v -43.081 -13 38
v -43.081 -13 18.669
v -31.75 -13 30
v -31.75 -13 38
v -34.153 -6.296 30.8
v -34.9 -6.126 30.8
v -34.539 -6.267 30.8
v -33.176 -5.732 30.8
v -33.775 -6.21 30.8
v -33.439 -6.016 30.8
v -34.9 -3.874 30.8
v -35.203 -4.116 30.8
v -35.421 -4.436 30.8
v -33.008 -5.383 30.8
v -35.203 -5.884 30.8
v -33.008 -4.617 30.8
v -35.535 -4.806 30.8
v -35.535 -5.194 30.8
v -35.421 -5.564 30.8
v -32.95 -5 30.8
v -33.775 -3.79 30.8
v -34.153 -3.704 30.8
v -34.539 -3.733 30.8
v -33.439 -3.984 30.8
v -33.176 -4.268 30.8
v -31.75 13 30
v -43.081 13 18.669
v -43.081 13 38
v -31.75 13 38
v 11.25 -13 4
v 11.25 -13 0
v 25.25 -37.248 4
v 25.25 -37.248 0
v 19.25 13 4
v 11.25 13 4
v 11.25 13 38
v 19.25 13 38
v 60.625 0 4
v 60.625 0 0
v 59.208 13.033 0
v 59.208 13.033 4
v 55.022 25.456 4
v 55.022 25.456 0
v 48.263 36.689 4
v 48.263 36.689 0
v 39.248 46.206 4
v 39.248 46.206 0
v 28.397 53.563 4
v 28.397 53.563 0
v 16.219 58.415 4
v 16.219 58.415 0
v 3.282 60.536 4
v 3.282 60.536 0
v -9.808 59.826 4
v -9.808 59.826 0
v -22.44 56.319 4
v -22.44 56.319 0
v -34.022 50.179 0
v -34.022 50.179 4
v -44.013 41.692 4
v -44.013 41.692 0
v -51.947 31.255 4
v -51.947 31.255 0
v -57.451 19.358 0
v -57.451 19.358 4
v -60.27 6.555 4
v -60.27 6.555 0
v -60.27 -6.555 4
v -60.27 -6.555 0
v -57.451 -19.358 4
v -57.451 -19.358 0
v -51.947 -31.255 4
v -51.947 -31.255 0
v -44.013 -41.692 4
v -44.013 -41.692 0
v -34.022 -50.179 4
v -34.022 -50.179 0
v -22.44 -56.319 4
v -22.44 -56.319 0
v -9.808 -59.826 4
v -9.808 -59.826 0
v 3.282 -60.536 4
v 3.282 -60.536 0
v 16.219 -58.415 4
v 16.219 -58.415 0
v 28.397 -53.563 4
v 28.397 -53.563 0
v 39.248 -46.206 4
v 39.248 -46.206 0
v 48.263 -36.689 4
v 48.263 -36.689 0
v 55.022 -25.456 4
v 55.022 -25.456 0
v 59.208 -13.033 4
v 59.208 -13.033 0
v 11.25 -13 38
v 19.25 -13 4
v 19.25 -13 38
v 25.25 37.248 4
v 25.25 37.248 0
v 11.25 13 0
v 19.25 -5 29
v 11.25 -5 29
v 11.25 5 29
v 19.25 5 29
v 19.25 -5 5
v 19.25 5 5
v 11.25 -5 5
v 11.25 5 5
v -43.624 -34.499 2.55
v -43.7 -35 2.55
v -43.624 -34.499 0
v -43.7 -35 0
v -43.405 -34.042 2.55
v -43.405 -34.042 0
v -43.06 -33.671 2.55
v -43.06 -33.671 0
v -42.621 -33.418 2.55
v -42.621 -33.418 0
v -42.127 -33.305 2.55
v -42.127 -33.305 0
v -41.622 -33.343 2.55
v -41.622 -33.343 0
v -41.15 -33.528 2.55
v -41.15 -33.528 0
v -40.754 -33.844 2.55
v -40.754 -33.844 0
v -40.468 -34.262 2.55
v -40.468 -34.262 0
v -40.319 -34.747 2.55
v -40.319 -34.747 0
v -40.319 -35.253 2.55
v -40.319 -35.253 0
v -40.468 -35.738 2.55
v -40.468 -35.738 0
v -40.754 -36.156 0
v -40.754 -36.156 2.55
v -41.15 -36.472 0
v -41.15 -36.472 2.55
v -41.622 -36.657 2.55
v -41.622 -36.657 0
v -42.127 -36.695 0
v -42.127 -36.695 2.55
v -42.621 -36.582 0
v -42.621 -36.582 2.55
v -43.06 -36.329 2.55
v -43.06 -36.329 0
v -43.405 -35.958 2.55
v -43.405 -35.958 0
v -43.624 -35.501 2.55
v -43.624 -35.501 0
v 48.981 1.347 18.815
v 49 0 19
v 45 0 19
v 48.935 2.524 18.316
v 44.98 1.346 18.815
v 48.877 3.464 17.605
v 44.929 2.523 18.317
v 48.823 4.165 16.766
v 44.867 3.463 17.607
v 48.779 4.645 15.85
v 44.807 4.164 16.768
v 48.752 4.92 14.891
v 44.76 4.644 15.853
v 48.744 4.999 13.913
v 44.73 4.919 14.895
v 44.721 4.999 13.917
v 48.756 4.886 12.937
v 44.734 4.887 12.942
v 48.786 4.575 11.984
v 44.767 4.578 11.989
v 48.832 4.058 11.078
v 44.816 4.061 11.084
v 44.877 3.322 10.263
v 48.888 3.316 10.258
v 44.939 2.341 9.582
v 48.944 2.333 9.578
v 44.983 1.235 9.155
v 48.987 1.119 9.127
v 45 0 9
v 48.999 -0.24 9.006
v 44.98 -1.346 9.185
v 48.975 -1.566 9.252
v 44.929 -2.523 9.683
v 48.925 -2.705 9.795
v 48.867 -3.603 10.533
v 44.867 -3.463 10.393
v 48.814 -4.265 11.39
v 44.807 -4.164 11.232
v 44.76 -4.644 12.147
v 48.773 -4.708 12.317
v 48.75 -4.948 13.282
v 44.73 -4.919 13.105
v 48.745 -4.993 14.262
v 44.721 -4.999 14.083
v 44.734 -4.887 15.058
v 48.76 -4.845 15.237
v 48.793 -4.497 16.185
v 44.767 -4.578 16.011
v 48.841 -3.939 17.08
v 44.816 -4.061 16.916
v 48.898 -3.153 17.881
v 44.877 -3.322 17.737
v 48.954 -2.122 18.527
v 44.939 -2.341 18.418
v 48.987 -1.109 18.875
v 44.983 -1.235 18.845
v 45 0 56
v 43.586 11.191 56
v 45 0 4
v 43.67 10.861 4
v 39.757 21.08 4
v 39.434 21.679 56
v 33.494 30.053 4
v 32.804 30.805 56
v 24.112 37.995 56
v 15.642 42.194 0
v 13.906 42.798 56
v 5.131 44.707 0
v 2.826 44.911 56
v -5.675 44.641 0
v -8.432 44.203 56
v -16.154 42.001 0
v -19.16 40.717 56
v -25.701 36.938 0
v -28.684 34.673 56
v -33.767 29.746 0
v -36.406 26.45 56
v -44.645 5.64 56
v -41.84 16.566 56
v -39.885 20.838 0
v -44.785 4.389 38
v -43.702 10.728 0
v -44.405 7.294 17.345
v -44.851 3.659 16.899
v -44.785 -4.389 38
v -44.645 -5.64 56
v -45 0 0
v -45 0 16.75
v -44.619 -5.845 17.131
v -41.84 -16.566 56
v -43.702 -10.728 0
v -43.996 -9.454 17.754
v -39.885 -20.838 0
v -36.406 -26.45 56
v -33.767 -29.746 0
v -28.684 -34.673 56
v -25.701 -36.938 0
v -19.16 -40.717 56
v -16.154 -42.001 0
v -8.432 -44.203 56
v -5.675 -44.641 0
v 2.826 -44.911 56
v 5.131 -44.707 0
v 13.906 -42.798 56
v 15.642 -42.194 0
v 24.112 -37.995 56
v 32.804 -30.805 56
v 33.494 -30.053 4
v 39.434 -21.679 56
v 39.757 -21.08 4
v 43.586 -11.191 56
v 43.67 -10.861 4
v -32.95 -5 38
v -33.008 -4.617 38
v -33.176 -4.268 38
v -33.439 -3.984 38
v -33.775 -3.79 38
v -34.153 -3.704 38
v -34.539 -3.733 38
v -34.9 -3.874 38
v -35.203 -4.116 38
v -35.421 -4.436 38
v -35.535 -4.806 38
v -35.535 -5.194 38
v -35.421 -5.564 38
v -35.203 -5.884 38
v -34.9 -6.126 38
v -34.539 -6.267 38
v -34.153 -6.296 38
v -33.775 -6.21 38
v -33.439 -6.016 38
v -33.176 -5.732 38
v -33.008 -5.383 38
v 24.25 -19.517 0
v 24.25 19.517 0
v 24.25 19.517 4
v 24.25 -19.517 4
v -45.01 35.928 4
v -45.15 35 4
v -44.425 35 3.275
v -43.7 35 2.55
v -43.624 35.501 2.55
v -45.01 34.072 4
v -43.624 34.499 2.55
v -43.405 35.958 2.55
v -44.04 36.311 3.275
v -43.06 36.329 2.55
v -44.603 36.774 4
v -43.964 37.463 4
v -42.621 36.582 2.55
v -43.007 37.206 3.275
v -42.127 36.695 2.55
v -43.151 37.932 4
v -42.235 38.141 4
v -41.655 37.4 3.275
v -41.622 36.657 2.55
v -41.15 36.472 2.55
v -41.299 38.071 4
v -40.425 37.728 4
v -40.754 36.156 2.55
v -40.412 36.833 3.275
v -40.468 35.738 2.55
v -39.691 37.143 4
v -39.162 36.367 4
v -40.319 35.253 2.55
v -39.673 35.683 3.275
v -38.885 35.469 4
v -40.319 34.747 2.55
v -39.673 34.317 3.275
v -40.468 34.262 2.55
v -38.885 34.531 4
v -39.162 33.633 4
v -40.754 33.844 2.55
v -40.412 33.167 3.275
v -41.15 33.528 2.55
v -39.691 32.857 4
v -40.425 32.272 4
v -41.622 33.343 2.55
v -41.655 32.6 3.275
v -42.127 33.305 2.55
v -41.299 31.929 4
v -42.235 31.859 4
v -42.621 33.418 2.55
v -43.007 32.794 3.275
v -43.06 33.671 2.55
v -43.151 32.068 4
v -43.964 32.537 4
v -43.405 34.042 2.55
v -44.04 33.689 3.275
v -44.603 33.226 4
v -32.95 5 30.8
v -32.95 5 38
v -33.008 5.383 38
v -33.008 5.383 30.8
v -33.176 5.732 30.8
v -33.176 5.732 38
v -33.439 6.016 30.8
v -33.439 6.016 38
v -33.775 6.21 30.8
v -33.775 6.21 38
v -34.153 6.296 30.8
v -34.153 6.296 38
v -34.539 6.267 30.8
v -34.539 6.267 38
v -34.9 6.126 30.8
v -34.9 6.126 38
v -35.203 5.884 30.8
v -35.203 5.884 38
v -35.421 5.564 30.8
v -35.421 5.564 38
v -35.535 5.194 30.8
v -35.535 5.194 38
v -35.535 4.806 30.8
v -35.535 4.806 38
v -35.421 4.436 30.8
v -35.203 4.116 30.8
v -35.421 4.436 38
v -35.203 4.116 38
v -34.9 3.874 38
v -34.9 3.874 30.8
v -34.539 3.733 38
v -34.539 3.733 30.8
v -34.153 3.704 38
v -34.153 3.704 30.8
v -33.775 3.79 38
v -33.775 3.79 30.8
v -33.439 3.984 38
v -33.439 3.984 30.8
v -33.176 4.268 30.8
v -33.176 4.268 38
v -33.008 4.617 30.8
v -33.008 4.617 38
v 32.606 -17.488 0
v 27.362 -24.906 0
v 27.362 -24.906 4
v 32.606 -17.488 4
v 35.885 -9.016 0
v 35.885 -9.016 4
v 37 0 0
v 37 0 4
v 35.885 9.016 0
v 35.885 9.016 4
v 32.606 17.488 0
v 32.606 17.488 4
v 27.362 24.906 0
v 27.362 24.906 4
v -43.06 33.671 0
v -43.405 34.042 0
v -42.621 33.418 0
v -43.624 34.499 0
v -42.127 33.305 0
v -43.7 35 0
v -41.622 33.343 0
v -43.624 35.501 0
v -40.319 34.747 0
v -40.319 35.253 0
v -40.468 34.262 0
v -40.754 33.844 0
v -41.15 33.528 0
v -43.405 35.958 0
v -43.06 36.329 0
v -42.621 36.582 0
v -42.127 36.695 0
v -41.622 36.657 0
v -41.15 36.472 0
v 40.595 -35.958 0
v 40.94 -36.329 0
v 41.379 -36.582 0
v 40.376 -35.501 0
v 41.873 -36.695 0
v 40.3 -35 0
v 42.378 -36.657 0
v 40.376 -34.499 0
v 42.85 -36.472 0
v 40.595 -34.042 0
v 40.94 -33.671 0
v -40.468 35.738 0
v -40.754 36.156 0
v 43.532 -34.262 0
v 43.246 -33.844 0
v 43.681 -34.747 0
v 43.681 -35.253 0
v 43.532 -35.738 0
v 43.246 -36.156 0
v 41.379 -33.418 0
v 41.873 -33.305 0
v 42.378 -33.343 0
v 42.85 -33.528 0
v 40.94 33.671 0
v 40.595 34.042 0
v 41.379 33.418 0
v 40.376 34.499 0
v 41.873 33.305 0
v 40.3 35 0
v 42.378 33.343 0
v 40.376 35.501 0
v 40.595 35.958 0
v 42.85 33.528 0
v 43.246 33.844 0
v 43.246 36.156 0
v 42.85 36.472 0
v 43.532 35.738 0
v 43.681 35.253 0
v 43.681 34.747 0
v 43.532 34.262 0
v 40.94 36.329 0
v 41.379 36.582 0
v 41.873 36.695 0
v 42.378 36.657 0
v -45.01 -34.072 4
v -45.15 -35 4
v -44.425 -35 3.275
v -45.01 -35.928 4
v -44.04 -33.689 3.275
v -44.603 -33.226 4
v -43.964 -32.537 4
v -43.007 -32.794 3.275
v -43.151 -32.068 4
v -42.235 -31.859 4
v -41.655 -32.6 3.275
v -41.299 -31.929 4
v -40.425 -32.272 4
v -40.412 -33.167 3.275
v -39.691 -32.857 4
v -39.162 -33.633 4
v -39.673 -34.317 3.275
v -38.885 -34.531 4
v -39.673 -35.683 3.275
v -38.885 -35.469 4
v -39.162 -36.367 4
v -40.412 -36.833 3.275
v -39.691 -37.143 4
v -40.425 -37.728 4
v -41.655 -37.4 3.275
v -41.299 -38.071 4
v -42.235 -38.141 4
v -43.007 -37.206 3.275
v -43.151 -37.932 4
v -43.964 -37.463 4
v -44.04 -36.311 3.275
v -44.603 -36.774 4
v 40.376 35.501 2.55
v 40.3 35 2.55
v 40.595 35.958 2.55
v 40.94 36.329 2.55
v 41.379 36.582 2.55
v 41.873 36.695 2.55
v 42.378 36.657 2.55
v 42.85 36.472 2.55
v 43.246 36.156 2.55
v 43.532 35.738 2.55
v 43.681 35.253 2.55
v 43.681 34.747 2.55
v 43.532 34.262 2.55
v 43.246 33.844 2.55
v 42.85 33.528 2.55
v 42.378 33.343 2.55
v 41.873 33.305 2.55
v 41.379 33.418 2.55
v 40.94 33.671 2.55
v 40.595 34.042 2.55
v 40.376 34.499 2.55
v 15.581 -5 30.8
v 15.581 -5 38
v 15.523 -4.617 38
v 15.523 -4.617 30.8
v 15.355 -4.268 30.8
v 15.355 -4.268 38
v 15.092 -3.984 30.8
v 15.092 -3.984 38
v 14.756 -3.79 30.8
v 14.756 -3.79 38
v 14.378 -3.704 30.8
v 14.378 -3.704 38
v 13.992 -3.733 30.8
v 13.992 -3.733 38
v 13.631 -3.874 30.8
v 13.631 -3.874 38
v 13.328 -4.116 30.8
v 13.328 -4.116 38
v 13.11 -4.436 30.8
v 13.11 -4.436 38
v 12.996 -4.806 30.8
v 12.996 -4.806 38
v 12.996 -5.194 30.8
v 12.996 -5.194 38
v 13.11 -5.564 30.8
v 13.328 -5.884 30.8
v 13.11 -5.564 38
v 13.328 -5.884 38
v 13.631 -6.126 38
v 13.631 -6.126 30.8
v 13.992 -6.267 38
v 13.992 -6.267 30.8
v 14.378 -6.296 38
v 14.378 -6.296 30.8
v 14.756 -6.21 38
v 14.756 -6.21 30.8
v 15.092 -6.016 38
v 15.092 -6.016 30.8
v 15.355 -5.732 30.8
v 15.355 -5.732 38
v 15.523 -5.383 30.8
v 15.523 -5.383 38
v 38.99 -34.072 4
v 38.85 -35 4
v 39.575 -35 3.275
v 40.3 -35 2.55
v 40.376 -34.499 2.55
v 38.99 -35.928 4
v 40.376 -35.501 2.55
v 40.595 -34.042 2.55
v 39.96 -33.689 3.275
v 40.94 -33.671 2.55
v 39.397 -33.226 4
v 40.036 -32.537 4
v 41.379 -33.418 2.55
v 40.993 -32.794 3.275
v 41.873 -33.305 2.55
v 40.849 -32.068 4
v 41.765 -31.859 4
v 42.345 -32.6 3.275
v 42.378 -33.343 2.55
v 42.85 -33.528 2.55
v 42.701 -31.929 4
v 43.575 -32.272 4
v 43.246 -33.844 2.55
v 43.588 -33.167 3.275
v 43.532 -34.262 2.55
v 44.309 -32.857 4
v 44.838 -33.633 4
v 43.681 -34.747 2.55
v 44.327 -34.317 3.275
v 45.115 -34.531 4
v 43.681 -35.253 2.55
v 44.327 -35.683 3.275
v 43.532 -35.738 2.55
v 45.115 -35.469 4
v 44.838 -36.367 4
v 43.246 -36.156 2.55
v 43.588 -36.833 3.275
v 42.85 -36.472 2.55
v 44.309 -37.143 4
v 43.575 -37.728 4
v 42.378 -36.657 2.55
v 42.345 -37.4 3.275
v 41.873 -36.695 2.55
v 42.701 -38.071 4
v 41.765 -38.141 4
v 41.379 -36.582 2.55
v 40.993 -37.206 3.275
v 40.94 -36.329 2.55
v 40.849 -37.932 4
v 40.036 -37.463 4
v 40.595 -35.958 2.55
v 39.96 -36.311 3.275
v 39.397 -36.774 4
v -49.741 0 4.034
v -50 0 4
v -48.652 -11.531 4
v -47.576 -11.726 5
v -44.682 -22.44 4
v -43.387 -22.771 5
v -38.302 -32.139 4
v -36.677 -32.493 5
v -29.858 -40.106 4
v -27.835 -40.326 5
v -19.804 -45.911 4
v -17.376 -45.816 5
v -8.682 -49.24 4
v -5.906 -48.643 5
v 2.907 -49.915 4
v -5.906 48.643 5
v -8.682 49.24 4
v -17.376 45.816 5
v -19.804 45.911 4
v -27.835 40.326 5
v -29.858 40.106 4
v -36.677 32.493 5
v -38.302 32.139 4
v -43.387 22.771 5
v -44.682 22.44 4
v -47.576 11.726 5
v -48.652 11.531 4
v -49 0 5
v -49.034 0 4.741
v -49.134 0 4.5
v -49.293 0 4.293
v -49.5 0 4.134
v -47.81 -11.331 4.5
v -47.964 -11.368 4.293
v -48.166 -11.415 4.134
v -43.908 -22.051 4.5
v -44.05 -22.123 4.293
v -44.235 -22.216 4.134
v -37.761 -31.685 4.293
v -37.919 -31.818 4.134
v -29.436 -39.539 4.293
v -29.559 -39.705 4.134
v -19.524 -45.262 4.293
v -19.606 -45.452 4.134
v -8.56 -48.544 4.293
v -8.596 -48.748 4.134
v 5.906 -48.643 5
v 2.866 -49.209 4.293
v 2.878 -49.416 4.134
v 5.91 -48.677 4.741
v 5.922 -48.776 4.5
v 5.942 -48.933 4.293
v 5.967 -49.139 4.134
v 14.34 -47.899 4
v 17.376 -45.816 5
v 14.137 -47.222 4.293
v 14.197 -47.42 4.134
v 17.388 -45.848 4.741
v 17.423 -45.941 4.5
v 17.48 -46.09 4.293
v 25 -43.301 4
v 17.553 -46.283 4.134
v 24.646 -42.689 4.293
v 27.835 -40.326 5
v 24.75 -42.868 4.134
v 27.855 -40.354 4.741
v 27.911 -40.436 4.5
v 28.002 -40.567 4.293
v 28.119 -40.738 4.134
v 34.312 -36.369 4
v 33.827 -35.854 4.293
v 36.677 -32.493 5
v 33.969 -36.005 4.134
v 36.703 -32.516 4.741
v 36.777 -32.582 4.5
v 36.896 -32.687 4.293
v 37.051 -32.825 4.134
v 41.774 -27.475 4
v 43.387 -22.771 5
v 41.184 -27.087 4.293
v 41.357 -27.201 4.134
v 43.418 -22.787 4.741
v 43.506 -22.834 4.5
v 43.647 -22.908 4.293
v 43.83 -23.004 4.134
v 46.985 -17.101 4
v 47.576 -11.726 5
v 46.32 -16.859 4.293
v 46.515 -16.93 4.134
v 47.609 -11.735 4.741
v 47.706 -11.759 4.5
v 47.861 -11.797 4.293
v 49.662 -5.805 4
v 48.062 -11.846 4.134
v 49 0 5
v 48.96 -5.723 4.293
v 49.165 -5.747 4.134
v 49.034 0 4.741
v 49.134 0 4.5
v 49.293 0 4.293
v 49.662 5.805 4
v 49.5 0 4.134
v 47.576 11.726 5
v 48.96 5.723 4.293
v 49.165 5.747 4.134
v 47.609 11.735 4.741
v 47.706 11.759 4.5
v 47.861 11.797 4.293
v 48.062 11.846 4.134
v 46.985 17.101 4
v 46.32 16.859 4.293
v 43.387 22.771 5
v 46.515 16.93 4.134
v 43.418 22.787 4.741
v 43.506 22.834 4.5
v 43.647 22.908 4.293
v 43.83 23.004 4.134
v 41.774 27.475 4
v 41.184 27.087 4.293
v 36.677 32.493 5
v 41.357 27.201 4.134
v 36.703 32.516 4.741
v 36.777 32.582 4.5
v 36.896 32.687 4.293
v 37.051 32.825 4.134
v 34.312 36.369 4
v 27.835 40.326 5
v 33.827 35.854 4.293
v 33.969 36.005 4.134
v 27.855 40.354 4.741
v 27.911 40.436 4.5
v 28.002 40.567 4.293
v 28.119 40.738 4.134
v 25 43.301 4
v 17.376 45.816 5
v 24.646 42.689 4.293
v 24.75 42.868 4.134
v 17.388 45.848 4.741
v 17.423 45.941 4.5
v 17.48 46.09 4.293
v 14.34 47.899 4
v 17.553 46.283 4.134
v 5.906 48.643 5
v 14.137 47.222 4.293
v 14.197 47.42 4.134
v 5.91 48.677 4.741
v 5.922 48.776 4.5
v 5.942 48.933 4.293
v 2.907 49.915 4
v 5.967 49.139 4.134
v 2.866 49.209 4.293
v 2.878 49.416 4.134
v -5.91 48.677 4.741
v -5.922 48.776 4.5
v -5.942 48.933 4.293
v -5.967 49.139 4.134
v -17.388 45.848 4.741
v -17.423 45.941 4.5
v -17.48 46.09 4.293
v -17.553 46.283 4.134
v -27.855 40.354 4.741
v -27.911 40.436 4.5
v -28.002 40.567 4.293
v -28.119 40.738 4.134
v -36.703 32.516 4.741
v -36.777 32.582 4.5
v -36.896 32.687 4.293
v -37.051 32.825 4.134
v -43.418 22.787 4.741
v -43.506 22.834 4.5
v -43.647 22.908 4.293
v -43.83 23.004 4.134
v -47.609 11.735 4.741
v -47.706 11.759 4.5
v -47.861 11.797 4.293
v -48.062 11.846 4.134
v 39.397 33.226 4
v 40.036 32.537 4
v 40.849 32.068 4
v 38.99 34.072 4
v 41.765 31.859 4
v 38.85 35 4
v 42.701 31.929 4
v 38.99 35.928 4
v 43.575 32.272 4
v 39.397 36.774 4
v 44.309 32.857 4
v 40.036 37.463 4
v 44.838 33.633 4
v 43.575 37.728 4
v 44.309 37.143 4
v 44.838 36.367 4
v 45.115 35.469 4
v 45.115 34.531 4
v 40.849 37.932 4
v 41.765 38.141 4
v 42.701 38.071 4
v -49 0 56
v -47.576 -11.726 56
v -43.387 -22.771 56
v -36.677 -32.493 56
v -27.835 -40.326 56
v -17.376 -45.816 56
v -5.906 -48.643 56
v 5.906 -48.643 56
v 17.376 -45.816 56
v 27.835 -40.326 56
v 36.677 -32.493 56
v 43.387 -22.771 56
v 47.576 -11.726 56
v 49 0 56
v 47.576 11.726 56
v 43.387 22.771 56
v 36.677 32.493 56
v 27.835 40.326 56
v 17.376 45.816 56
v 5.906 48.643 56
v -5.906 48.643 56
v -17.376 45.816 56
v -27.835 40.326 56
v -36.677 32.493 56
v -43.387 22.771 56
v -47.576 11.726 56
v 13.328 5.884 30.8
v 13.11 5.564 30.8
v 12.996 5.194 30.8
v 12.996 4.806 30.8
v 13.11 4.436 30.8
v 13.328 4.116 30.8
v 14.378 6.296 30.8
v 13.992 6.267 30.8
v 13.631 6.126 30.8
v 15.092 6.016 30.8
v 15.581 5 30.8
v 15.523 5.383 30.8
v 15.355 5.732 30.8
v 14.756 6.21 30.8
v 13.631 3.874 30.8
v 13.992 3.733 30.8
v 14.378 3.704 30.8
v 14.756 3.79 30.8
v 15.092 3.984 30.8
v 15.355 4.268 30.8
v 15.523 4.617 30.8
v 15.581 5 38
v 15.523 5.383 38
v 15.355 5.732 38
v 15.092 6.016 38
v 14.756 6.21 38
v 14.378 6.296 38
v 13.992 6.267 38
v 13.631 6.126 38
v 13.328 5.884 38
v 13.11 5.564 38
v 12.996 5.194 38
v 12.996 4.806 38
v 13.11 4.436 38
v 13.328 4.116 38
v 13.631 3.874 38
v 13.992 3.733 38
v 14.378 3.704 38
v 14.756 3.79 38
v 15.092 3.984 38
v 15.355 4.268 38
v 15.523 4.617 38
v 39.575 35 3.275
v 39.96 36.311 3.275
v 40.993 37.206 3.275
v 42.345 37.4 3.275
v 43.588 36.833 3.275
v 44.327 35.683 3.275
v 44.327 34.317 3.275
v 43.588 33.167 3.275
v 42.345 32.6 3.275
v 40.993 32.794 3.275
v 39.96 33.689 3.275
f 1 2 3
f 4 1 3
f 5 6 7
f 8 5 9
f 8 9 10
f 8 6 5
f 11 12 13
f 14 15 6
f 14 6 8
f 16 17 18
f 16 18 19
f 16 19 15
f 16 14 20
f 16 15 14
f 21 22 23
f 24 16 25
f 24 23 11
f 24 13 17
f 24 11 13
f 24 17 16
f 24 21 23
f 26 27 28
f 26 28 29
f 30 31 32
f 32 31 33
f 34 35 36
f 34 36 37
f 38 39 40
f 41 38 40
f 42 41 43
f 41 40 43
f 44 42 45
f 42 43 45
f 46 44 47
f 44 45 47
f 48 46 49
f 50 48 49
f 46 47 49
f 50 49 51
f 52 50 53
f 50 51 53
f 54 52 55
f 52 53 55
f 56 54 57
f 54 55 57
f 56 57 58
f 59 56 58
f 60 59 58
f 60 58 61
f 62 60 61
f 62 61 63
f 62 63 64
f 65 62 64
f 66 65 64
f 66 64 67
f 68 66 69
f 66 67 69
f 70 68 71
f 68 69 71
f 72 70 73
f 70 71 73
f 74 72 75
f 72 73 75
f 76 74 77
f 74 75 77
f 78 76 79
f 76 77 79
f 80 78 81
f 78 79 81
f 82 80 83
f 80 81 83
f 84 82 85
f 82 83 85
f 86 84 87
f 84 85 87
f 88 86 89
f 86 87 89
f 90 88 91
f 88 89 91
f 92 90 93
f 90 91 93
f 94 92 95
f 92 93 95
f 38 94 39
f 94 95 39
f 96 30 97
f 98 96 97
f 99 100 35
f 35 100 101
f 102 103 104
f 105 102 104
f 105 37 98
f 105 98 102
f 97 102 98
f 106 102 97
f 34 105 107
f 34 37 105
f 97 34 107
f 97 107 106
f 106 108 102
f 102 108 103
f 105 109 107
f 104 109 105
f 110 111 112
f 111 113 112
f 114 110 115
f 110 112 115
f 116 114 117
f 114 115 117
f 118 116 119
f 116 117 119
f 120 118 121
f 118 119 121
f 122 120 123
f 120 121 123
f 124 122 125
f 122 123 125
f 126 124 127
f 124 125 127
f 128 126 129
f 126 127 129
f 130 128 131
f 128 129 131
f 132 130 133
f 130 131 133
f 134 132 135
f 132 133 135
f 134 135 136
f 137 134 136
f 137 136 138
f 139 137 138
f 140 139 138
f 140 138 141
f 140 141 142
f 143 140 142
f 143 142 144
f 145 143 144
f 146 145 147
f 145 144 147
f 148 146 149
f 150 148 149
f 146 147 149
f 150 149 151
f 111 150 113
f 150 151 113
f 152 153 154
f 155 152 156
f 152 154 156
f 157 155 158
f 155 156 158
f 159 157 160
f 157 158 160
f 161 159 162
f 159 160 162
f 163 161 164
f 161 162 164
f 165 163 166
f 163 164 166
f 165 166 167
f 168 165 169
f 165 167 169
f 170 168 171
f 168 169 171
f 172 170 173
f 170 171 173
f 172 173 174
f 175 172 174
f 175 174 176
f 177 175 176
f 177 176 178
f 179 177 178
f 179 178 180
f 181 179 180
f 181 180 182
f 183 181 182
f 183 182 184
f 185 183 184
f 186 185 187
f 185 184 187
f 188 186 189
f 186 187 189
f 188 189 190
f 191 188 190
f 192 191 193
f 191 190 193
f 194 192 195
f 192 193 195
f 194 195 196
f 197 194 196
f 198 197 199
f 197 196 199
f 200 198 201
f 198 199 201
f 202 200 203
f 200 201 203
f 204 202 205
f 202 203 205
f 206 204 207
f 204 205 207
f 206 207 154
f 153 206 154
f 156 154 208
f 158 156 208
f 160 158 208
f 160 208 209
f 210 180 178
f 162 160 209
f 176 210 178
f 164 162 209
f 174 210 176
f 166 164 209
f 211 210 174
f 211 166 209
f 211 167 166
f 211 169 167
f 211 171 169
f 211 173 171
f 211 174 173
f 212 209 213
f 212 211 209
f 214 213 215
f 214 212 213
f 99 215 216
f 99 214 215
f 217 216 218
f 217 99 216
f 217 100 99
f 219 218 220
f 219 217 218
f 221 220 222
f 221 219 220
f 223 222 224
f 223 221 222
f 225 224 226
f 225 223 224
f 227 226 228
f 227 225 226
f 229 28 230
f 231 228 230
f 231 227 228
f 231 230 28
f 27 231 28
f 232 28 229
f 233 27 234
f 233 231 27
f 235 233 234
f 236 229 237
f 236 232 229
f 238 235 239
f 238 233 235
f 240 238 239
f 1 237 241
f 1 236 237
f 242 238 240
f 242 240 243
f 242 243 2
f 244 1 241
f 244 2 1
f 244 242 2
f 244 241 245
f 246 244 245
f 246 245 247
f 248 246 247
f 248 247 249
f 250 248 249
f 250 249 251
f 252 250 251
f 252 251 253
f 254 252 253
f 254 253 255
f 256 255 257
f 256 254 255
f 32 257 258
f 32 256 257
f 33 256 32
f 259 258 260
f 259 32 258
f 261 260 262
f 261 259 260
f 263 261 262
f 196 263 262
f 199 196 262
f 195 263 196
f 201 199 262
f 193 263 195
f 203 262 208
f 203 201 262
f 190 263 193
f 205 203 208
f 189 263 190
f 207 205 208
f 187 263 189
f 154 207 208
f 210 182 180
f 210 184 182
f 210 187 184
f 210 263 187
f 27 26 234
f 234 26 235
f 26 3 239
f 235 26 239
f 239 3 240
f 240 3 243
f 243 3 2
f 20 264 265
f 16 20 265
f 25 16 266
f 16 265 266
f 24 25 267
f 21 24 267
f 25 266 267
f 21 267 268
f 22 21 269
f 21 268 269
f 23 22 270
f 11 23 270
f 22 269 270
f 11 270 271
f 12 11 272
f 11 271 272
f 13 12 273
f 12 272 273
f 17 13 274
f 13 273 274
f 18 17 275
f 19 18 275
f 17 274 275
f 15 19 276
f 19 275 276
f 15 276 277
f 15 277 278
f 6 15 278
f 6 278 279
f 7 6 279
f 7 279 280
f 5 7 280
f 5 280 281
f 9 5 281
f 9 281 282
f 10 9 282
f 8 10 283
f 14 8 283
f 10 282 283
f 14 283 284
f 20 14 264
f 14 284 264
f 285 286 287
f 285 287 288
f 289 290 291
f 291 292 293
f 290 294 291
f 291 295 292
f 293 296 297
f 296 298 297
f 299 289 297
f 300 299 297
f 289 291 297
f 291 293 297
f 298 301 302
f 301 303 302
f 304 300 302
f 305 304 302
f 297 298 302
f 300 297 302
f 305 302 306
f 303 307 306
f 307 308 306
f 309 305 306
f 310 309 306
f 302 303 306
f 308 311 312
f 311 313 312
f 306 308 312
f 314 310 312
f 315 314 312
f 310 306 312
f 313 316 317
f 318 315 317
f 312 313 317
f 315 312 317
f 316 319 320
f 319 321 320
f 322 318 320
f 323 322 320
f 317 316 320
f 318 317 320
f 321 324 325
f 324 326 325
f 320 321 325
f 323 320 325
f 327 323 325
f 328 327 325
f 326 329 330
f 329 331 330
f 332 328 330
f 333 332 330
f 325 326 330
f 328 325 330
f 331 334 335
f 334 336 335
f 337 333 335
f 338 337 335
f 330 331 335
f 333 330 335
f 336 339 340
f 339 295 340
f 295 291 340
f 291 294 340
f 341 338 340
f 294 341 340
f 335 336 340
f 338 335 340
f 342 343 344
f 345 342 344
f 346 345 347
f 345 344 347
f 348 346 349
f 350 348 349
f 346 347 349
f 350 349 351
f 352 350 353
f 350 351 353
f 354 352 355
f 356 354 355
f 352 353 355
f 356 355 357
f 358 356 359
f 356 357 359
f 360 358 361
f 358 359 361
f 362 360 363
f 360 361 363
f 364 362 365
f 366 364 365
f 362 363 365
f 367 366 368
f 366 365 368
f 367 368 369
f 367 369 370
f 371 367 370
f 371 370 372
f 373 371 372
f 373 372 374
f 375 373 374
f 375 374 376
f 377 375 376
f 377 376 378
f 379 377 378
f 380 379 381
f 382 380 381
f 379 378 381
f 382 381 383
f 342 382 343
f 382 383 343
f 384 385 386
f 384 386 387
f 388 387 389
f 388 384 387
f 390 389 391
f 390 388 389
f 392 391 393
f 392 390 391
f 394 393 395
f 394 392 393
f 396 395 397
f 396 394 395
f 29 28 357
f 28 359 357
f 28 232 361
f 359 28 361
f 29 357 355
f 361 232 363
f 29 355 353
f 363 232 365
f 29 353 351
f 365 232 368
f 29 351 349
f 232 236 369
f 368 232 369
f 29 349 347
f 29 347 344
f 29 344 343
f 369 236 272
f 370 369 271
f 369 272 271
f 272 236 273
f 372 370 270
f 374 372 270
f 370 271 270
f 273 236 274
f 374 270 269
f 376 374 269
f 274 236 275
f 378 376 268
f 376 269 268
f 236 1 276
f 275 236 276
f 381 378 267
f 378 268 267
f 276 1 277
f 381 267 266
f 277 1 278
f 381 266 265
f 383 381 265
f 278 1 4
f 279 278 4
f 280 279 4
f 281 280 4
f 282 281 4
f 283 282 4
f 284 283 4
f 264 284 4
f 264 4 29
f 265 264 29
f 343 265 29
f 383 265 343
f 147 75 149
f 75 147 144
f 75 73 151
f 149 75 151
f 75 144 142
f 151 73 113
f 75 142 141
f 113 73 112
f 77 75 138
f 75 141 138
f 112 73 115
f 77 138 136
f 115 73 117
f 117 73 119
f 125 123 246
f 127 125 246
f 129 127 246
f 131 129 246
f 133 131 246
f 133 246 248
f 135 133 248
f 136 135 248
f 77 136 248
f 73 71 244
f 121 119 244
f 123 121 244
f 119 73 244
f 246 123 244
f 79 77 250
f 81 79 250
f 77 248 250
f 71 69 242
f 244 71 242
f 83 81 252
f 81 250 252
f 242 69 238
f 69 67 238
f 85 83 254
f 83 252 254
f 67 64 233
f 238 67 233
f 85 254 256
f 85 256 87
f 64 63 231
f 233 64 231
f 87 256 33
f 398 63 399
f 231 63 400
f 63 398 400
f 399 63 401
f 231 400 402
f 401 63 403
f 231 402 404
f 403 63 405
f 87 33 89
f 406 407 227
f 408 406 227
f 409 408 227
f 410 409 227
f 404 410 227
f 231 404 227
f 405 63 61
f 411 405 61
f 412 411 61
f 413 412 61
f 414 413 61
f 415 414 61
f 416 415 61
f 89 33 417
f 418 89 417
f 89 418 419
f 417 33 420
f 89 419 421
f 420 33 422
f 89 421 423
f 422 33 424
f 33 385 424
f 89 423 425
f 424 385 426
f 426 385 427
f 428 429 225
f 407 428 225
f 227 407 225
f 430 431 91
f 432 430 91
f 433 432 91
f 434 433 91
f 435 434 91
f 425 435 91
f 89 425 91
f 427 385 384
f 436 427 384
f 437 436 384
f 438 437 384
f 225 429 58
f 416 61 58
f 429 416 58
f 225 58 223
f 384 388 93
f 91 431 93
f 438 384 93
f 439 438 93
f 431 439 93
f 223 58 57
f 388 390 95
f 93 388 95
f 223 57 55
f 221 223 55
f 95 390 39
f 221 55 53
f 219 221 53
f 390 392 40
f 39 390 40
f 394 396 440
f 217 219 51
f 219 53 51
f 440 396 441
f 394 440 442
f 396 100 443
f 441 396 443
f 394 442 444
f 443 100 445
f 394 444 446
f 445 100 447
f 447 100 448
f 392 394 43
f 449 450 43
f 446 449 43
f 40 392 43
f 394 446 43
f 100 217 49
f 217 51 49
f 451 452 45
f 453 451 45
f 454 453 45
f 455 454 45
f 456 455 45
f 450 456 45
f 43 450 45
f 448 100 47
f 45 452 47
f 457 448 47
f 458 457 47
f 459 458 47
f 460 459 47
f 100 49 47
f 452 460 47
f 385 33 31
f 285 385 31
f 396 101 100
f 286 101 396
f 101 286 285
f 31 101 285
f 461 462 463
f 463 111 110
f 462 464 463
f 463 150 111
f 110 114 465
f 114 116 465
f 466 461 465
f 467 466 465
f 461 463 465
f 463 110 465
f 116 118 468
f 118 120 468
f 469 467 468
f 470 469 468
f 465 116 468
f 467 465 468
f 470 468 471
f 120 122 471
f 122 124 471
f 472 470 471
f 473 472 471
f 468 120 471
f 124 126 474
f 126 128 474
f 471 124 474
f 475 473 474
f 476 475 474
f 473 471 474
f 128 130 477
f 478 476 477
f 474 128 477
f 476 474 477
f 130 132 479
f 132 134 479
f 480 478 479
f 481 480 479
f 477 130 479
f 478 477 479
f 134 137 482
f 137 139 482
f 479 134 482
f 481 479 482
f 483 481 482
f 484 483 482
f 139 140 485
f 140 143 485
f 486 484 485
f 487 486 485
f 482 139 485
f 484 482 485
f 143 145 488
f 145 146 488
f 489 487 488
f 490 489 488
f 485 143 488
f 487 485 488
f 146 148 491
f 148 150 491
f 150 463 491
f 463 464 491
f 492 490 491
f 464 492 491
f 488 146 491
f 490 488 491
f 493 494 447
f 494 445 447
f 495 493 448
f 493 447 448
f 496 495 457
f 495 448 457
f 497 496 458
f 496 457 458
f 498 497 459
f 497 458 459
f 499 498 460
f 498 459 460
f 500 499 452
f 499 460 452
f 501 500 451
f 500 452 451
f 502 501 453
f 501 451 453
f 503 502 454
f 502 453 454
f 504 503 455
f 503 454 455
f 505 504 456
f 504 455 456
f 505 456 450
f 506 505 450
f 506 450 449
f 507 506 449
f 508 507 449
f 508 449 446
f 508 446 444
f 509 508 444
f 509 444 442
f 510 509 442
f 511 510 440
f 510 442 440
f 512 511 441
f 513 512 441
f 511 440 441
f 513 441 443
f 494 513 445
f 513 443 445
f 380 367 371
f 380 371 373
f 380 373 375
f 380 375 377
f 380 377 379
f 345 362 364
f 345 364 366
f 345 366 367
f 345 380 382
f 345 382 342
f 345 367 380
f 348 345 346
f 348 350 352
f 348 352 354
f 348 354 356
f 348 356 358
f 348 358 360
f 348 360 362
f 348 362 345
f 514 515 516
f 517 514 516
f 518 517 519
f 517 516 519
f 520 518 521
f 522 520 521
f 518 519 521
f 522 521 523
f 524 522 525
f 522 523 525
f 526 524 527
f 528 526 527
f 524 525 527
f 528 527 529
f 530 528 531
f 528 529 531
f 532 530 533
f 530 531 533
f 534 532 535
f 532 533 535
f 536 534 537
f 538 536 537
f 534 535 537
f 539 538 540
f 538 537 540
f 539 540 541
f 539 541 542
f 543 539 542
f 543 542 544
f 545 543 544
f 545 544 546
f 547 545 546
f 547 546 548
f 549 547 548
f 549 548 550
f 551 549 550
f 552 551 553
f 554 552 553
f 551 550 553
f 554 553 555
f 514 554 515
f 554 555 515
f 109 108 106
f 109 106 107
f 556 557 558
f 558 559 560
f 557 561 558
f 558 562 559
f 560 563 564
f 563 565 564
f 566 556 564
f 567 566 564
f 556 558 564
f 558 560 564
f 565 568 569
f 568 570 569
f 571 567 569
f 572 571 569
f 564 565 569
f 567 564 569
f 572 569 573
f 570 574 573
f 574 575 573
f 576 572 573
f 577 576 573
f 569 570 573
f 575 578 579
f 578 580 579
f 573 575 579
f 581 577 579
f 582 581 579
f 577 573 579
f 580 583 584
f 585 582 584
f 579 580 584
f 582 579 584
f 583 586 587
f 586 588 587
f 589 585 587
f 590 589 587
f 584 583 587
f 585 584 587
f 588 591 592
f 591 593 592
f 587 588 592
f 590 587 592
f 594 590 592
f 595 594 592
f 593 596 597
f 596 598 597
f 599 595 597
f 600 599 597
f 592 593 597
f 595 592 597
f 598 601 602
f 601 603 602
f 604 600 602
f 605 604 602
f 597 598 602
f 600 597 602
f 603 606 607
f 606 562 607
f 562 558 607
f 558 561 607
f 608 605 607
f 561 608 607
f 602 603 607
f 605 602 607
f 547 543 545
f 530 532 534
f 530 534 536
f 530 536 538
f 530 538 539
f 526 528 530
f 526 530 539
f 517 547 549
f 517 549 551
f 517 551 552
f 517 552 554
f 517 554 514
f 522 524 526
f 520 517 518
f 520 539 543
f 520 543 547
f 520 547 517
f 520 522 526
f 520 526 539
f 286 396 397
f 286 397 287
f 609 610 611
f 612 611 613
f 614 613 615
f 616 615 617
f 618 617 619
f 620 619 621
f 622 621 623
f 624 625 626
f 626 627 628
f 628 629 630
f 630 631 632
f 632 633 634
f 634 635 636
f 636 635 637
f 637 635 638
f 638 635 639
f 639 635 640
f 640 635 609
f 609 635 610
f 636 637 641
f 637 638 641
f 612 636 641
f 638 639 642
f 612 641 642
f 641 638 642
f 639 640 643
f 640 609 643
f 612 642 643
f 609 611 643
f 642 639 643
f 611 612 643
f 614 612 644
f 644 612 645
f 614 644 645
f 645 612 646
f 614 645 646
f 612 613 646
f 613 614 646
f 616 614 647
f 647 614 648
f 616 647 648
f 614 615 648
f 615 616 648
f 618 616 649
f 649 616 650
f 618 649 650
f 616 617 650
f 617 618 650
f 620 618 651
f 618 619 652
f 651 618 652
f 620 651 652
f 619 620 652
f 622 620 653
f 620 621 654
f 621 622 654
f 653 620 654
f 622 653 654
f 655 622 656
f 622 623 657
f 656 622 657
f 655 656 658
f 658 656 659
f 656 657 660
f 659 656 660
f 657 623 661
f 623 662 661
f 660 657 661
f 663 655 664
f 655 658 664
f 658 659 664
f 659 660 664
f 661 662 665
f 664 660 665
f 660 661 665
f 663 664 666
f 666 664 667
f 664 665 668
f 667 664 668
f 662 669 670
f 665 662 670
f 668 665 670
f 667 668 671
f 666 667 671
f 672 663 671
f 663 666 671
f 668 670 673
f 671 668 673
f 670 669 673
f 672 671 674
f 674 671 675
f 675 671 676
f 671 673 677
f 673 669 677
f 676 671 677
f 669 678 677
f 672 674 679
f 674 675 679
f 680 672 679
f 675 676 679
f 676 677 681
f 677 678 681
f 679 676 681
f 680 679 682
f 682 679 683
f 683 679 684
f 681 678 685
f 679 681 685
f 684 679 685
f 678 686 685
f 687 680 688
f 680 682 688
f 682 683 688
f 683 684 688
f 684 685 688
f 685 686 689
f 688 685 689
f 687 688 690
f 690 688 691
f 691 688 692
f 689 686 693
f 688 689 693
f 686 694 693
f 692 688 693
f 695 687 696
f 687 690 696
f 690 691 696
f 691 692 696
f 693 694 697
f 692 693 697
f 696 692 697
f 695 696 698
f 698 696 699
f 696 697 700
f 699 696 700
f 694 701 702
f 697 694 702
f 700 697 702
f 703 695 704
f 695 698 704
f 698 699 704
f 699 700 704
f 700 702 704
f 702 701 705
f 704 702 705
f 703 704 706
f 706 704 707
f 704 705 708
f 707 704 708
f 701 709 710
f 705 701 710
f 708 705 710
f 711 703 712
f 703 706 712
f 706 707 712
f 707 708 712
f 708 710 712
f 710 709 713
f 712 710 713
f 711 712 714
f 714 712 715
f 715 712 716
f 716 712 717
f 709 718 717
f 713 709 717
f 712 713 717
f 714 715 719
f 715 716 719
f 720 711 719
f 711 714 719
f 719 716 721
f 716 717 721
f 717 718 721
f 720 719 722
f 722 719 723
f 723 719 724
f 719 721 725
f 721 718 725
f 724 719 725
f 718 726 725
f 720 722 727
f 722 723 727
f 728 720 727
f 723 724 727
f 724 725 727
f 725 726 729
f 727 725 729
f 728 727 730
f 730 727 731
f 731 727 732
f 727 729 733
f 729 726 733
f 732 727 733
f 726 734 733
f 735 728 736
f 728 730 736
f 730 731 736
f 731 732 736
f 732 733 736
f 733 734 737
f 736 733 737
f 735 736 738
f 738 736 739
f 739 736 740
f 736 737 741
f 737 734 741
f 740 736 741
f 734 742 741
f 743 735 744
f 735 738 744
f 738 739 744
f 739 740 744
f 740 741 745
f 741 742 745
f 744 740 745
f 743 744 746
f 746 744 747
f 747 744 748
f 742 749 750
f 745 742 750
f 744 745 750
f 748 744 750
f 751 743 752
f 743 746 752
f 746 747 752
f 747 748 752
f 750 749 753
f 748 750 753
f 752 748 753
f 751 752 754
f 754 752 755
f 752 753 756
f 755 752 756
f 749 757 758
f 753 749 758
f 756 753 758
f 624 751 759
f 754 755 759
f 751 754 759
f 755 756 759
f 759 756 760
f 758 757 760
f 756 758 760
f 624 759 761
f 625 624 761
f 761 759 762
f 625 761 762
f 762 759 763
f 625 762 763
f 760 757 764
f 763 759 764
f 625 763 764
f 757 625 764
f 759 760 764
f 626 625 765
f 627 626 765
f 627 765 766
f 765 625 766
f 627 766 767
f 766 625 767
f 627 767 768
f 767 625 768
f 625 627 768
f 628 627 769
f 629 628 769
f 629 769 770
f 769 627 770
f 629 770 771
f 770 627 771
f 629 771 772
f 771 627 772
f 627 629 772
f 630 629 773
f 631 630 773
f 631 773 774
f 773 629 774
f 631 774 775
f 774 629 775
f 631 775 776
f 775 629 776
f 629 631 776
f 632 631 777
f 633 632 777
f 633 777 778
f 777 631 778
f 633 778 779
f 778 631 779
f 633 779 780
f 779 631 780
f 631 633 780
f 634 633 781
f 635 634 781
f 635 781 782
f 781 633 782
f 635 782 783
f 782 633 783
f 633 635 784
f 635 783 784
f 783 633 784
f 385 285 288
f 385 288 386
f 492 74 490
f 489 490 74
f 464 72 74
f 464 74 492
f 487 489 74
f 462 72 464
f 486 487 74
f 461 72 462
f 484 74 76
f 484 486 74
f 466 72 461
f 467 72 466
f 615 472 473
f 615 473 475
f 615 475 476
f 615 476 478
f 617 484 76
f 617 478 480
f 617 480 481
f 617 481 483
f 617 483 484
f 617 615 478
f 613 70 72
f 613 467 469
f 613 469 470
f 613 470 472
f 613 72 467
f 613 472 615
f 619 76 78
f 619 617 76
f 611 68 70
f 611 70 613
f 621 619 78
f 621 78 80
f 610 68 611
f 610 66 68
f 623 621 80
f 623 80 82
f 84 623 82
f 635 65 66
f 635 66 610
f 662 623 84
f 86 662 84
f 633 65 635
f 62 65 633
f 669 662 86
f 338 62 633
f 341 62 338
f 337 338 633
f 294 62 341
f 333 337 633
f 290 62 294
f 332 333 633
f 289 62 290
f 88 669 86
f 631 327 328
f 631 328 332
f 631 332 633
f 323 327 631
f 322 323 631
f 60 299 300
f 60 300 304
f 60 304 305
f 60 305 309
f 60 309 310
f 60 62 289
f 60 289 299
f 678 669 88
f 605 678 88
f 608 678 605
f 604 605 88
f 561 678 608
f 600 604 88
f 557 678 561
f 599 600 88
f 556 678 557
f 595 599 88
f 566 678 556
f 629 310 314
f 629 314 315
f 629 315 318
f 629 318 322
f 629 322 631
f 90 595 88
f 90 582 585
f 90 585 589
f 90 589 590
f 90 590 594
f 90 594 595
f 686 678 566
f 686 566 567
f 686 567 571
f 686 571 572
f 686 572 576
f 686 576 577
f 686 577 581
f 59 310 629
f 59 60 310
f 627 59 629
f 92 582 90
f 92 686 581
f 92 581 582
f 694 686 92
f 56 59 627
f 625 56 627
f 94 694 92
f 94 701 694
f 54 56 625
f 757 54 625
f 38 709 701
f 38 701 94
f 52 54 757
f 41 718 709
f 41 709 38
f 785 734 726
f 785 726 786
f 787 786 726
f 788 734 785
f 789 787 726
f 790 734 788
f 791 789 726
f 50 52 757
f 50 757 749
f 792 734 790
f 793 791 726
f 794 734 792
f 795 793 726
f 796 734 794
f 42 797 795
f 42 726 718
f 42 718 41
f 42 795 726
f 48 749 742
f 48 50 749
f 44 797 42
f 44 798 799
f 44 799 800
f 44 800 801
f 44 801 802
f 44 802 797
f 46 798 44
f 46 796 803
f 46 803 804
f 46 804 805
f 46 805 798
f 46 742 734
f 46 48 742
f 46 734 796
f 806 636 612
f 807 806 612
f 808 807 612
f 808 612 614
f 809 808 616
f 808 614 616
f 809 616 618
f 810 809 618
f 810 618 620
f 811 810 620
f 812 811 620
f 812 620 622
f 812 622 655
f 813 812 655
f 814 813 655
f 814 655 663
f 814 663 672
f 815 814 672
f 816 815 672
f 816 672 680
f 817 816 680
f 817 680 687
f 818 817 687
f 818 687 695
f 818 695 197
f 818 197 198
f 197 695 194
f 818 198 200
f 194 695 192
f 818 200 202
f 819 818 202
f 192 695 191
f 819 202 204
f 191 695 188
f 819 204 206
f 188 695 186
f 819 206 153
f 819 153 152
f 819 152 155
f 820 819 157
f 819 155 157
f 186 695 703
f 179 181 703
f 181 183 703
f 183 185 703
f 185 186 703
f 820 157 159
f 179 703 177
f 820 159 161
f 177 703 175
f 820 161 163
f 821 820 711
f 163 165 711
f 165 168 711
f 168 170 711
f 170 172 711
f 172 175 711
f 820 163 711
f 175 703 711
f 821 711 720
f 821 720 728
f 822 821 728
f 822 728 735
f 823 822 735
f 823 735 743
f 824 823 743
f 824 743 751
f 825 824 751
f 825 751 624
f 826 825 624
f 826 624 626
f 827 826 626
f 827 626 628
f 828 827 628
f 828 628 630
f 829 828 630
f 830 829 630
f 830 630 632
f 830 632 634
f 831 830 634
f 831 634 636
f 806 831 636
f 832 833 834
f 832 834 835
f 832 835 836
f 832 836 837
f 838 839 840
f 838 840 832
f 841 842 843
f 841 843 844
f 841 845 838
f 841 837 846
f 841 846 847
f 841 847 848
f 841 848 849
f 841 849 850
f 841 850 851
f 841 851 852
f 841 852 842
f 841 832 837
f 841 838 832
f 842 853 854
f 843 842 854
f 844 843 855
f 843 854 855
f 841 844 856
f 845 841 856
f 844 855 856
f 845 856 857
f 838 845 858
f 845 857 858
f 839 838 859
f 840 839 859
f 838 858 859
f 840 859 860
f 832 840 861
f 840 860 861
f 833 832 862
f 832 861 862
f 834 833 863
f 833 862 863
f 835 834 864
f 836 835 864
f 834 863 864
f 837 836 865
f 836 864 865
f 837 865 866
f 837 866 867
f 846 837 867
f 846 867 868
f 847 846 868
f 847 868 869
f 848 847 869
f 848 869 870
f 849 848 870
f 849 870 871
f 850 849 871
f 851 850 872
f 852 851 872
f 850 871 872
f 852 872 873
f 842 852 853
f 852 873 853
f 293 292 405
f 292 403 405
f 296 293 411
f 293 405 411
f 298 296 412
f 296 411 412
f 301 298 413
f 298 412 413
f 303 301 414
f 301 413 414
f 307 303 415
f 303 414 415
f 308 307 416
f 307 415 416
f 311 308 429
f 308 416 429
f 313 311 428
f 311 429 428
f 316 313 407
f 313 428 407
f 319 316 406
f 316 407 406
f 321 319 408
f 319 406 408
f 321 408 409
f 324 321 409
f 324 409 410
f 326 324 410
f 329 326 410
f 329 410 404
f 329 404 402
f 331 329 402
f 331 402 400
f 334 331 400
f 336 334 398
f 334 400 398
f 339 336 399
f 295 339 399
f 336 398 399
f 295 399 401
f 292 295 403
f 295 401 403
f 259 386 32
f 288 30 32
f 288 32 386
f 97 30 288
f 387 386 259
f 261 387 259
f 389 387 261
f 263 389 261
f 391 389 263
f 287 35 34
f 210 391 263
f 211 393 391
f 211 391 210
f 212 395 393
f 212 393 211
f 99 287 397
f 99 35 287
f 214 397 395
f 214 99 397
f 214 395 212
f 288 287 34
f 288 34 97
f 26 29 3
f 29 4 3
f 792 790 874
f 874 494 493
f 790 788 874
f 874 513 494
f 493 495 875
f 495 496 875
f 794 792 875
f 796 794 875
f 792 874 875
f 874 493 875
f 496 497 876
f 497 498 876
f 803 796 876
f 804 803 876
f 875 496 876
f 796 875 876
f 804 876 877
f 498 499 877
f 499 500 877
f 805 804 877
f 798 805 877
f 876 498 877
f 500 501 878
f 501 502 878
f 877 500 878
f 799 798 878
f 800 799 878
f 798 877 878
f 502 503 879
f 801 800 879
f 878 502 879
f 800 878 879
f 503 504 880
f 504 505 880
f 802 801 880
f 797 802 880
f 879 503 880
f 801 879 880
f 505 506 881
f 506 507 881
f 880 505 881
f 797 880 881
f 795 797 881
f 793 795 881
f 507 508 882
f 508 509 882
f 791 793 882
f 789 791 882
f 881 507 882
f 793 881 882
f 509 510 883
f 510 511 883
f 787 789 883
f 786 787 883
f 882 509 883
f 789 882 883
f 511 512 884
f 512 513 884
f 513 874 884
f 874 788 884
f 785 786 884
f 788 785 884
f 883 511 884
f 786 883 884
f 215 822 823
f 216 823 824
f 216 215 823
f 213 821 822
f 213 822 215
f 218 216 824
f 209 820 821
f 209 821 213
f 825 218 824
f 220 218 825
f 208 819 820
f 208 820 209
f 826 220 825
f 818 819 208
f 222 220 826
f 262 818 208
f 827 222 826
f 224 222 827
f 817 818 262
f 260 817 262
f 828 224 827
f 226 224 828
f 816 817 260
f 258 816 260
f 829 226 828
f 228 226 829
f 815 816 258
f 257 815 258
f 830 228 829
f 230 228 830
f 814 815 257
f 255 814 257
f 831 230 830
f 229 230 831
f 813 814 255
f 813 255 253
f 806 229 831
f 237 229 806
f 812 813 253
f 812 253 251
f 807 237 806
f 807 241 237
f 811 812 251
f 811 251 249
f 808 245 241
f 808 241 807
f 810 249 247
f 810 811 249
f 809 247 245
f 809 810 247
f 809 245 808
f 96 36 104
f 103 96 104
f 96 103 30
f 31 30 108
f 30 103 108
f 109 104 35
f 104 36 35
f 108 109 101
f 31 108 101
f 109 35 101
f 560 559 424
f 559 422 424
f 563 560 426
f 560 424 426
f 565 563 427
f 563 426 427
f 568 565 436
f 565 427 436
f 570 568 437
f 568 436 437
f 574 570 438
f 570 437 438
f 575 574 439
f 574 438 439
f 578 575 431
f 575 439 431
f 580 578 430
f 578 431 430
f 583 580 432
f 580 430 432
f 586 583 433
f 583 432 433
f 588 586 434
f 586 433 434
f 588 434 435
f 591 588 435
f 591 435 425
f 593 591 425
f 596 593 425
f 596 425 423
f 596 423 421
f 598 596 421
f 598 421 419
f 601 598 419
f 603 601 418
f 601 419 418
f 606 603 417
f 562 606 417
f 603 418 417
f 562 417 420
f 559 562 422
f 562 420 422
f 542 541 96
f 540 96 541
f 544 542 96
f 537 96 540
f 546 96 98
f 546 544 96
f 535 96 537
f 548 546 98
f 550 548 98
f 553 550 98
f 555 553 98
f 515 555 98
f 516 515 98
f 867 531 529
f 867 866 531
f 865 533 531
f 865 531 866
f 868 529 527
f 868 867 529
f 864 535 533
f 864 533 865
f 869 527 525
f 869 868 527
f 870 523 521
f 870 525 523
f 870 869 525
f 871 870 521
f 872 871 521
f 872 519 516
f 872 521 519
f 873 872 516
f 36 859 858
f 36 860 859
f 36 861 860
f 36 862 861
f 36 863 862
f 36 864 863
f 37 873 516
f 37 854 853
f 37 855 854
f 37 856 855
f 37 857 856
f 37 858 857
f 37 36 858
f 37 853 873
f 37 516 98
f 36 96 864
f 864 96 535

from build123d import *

# Parameters (mm, degrees)
SKETCH1_R                                           = 60.625
SKETCH1_R_2                                         = 45
BOSS_EXTRUDE1_DEPTH                                 = 4
SKETCH2_R                                           = 49
SKETCH2_R_2                                         = 45
BOSS_EXTRUDE2_DEPTH                                 = 52
SKETCH3_W                                           = 13.25
SKETCH3_H                                           = 8
SKETCH3_W_2                                         = 8
SKETCH3_H_2                                         = 38
BOSS_EXTRUDE3_DEPTH                                 = 13
SKETCH4_W                                           = 24
SKETCH4_H                                           = 10
CUT_EXTRUDE1_DEPTH                                  = 26
SKETCH5_R                                           = 5
CUT_EXTRUDE2_DEPTH                                  = 74
SKETCH6_R                                           = 1.3
CUT_EXTRUDE3_DEPTH                                  = 7.2
BOSS_EXTRUDE4_DEPTH                                 = 4
CSK_FOR_M3_COUNTERSUNK_FLAT_HEAD_SCREW1_D           = 3.4
CSK_FOR_M3_COUNTERSUNK_FLAT_HEAD_SCREW1_DEPTH       = 4
CSK_FOR_M3_COUNTERSUNK_FLAT_HEAD_SCREW1_CSINK_D     = 6.3
CSK_FOR_M3_COUNTERSUNK_FLAT_HEAD_SCREW1_CSINK_ANGLE = 90
CSK_FOR_M3_COUNTERSUNK_FLAT_HEAD_SCREW1_TIP         = 1.021463052
FILLET1_R                                           = 1


with BuildPart() as part:
    # Sketch1 → Boss-Extrude1 (new body)
    with BuildSketch(Plane.XY):
        Circle(SKETCH1_R)
        Circle(SKETCH1_R_2, mode=Mode.SUBTRACT)
    extrude(amount=BOSS_EXTRUDE1_DEPTH)

    # Sketch2 → Boss-Extrude2 (add)
    with BuildSketch(Plane.XY.offset(4)):
        with Locations(Location((0, 0, 0), (0, 0, 180))):
            Circle(SKETCH2_R)
        Circle(SKETCH2_R_2, mode=Mode.SUBTRACT)
    extrude(amount=BOSS_EXTRUDE2_DEPTH)

    # Sketch3 → Boss-Extrude3 (add, symmetric)
    with BuildSketch(Plane(origin=(0, 0, 0), x_dir=(1, 0, 0), z_dir=(0, 1, 0))):
        with Locations((-38.375, -34)):
            Rectangle(SKETCH3_W, SKETCH3_H)
        Polygon((-45, -16.75), (-45, -30), (-31.75, -30), align=None)
        with Locations((15.25, -19)):
            Rectangle(SKETCH3_W_2, SKETCH3_H_2)
    extrude(amount=BOSS_EXTRUDE3_DEPTH, both=True)


with BuildPart() as boss_extrude3_piece_1:
    # of the separate pieces the step leaves, piece 1, a body of its own (boss_extrude3_pieces)
    add(part.part.solids().sort_by_distance((60.625, 0, 0))[0])

    # Sketch5 → Cut-Extrude2 (cut)
    with BuildSketch(Plane.ZY.offset(-11.25)):
        with Locations((14, 0)):
            Circle(SKETCH5_R)
    extrude(amount=-CUT_EXTRUDE2_DEPTH, mode=Mode.SUBTRACT)


with BuildPart() as boss_extrude3_piece_2:
    # of the separate pieces the step leaves, piece 2, a body of its own (boss_extrude3_pieces)
    add(part.part.solids().sort_by_distance((19.25, -13, 0))[0])

    # Sketch4 → Cut-Extrude1 (cut)
    with BuildSketch(Plane.ZY.offset(-11.25)):
        with Locations((17, 0)):
            Rectangle(SKETCH4_W, SKETCH4_H)
    extrude(amount=-CUT_EXTRUDE1_DEPTH, mode=Mode.SUBTRACT)


with BuildPart() as cut_extrude3_tool:
    # Sketch6 → Cut-Extrude3 (new body)
    with BuildSketch(Plane.XY.offset(38)):
        with Locations((-34.25, 5)):
            Circle(SKETCH6_R)
        with Locations((-34.25, -5)):
            Circle(SKETCH6_R)
        with Locations((14.281113412, 5)):
            Circle(SKETCH6_R)
        with Locations((14.281113412, -5)):
            Circle(SKETCH6_R)
    extrude(amount=-CUT_EXTRUDE3_DEPTH)


with BuildPart() as boss_extrude3_piece_1_1:
    add(boss_extrude3_piece_1.part)

    # Cut-Extrude3: cut by cut_extrude3_tool
    add(cut_extrude3_tool.part, mode=Mode.SUBTRACT)



with BuildPart() as boss_extrude3_piece_2_1:
    add(boss_extrude3_piece_2.part)

    # Cut-Extrude3: cut by cut_extrude3_tool
    add(cut_extrude3_tool.part, mode=Mode.SUBTRACT)


with BuildPart() as boss_extrude3_piece_1_2:
    add(boss_extrude3_piece_1_1.part)

    add(boss_extrude3_piece_2_1.part)  # Boss-Extrude4 merges Boss-Extrude3 piece 2
    # Sketch8 → Boss-Extrude4 (add)
    with BuildSketch(Plane(origin=(0, 0, 0), x_dir=(-1, 0, 0), z_dir=(0, 0, -1))):
        with BuildLine():
            Line((-11.25, 13), (-11.25, -13))
            Line((-11.25, -13), (-25.249838503, -37.248431585))
            ThreePointArc((-25.249838503, -37.248431585), (-45, 0), (-25.249838503, 37.248431585))
            Line((-25.249838503, 37.248431585), (-11.25, 13))
        make_face()
        with BuildLine():
            Line((-24.25, -19.516660498), (-27.361802413, -24.906460381))
            ThreePointArc((-27.361802413, -24.906460381), (-37, 0), (-27.361802413, 24.906460381))
            Line((-27.361802413, 24.906460381), (-24.25, 19.516660498))
            Line((-24.25, 19.516660498), (-24.25, -19.516660498))
        make_face(mode=Mode.SUBTRACT)
    extrude(amount=-BOSS_EXTRUDE4_DEPTH)

    # CSK for M3 Countersunk Flat Head Screw1
    with Locations(Plane.XY.offset(4)):
        with Locations((-42, -35), (42, -35), (42, 35), (-42, 35)):
            CounterSinkHole(CSK_FOR_M3_COUNTERSUNK_FLAT_HEAD_SCREW1_D / 2, CSK_FOR_M3_COUNTERSUNK_FLAT_HEAD_SCREW1_CSINK_D / 2, depth=CSK_FOR_M3_COUNTERSUNK_FLAT_HEAD_SCREW1_DEPTH, counter_sink_angle=CSK_FOR_M3_COUNTERSUNK_FLAT_HEAD_SCREW1_CSINK_ANGLE)
            with Locations((0, 0, -(CSK_FOR_M3_COUNTERSUNK_FLAT_HEAD_SCREW1_DEPTH + CSK_FOR_M3_COUNTERSUNK_FLAT_HEAD_SCREW1_TIP / 2))):  # 118° drill point
                Cone(0, CSK_FOR_M3_COUNTERSUNK_FLAT_HEAD_SCREW1_D / 2, CSK_FOR_M3_COUNTERSUNK_FLAT_HEAD_SCREW1_TIP, mode=Mode.SUBTRACT)

    # Fillet1
    fillet1_edges = [boss_extrude3_piece_1_2.edges().sort_by_distance(p)[0] for p in [
        (49, 0, 4),
    ]]
    fillet(fillet1_edges, radius=FILLET1_R)


solid = boss_extrude3_piece_1_2.part
